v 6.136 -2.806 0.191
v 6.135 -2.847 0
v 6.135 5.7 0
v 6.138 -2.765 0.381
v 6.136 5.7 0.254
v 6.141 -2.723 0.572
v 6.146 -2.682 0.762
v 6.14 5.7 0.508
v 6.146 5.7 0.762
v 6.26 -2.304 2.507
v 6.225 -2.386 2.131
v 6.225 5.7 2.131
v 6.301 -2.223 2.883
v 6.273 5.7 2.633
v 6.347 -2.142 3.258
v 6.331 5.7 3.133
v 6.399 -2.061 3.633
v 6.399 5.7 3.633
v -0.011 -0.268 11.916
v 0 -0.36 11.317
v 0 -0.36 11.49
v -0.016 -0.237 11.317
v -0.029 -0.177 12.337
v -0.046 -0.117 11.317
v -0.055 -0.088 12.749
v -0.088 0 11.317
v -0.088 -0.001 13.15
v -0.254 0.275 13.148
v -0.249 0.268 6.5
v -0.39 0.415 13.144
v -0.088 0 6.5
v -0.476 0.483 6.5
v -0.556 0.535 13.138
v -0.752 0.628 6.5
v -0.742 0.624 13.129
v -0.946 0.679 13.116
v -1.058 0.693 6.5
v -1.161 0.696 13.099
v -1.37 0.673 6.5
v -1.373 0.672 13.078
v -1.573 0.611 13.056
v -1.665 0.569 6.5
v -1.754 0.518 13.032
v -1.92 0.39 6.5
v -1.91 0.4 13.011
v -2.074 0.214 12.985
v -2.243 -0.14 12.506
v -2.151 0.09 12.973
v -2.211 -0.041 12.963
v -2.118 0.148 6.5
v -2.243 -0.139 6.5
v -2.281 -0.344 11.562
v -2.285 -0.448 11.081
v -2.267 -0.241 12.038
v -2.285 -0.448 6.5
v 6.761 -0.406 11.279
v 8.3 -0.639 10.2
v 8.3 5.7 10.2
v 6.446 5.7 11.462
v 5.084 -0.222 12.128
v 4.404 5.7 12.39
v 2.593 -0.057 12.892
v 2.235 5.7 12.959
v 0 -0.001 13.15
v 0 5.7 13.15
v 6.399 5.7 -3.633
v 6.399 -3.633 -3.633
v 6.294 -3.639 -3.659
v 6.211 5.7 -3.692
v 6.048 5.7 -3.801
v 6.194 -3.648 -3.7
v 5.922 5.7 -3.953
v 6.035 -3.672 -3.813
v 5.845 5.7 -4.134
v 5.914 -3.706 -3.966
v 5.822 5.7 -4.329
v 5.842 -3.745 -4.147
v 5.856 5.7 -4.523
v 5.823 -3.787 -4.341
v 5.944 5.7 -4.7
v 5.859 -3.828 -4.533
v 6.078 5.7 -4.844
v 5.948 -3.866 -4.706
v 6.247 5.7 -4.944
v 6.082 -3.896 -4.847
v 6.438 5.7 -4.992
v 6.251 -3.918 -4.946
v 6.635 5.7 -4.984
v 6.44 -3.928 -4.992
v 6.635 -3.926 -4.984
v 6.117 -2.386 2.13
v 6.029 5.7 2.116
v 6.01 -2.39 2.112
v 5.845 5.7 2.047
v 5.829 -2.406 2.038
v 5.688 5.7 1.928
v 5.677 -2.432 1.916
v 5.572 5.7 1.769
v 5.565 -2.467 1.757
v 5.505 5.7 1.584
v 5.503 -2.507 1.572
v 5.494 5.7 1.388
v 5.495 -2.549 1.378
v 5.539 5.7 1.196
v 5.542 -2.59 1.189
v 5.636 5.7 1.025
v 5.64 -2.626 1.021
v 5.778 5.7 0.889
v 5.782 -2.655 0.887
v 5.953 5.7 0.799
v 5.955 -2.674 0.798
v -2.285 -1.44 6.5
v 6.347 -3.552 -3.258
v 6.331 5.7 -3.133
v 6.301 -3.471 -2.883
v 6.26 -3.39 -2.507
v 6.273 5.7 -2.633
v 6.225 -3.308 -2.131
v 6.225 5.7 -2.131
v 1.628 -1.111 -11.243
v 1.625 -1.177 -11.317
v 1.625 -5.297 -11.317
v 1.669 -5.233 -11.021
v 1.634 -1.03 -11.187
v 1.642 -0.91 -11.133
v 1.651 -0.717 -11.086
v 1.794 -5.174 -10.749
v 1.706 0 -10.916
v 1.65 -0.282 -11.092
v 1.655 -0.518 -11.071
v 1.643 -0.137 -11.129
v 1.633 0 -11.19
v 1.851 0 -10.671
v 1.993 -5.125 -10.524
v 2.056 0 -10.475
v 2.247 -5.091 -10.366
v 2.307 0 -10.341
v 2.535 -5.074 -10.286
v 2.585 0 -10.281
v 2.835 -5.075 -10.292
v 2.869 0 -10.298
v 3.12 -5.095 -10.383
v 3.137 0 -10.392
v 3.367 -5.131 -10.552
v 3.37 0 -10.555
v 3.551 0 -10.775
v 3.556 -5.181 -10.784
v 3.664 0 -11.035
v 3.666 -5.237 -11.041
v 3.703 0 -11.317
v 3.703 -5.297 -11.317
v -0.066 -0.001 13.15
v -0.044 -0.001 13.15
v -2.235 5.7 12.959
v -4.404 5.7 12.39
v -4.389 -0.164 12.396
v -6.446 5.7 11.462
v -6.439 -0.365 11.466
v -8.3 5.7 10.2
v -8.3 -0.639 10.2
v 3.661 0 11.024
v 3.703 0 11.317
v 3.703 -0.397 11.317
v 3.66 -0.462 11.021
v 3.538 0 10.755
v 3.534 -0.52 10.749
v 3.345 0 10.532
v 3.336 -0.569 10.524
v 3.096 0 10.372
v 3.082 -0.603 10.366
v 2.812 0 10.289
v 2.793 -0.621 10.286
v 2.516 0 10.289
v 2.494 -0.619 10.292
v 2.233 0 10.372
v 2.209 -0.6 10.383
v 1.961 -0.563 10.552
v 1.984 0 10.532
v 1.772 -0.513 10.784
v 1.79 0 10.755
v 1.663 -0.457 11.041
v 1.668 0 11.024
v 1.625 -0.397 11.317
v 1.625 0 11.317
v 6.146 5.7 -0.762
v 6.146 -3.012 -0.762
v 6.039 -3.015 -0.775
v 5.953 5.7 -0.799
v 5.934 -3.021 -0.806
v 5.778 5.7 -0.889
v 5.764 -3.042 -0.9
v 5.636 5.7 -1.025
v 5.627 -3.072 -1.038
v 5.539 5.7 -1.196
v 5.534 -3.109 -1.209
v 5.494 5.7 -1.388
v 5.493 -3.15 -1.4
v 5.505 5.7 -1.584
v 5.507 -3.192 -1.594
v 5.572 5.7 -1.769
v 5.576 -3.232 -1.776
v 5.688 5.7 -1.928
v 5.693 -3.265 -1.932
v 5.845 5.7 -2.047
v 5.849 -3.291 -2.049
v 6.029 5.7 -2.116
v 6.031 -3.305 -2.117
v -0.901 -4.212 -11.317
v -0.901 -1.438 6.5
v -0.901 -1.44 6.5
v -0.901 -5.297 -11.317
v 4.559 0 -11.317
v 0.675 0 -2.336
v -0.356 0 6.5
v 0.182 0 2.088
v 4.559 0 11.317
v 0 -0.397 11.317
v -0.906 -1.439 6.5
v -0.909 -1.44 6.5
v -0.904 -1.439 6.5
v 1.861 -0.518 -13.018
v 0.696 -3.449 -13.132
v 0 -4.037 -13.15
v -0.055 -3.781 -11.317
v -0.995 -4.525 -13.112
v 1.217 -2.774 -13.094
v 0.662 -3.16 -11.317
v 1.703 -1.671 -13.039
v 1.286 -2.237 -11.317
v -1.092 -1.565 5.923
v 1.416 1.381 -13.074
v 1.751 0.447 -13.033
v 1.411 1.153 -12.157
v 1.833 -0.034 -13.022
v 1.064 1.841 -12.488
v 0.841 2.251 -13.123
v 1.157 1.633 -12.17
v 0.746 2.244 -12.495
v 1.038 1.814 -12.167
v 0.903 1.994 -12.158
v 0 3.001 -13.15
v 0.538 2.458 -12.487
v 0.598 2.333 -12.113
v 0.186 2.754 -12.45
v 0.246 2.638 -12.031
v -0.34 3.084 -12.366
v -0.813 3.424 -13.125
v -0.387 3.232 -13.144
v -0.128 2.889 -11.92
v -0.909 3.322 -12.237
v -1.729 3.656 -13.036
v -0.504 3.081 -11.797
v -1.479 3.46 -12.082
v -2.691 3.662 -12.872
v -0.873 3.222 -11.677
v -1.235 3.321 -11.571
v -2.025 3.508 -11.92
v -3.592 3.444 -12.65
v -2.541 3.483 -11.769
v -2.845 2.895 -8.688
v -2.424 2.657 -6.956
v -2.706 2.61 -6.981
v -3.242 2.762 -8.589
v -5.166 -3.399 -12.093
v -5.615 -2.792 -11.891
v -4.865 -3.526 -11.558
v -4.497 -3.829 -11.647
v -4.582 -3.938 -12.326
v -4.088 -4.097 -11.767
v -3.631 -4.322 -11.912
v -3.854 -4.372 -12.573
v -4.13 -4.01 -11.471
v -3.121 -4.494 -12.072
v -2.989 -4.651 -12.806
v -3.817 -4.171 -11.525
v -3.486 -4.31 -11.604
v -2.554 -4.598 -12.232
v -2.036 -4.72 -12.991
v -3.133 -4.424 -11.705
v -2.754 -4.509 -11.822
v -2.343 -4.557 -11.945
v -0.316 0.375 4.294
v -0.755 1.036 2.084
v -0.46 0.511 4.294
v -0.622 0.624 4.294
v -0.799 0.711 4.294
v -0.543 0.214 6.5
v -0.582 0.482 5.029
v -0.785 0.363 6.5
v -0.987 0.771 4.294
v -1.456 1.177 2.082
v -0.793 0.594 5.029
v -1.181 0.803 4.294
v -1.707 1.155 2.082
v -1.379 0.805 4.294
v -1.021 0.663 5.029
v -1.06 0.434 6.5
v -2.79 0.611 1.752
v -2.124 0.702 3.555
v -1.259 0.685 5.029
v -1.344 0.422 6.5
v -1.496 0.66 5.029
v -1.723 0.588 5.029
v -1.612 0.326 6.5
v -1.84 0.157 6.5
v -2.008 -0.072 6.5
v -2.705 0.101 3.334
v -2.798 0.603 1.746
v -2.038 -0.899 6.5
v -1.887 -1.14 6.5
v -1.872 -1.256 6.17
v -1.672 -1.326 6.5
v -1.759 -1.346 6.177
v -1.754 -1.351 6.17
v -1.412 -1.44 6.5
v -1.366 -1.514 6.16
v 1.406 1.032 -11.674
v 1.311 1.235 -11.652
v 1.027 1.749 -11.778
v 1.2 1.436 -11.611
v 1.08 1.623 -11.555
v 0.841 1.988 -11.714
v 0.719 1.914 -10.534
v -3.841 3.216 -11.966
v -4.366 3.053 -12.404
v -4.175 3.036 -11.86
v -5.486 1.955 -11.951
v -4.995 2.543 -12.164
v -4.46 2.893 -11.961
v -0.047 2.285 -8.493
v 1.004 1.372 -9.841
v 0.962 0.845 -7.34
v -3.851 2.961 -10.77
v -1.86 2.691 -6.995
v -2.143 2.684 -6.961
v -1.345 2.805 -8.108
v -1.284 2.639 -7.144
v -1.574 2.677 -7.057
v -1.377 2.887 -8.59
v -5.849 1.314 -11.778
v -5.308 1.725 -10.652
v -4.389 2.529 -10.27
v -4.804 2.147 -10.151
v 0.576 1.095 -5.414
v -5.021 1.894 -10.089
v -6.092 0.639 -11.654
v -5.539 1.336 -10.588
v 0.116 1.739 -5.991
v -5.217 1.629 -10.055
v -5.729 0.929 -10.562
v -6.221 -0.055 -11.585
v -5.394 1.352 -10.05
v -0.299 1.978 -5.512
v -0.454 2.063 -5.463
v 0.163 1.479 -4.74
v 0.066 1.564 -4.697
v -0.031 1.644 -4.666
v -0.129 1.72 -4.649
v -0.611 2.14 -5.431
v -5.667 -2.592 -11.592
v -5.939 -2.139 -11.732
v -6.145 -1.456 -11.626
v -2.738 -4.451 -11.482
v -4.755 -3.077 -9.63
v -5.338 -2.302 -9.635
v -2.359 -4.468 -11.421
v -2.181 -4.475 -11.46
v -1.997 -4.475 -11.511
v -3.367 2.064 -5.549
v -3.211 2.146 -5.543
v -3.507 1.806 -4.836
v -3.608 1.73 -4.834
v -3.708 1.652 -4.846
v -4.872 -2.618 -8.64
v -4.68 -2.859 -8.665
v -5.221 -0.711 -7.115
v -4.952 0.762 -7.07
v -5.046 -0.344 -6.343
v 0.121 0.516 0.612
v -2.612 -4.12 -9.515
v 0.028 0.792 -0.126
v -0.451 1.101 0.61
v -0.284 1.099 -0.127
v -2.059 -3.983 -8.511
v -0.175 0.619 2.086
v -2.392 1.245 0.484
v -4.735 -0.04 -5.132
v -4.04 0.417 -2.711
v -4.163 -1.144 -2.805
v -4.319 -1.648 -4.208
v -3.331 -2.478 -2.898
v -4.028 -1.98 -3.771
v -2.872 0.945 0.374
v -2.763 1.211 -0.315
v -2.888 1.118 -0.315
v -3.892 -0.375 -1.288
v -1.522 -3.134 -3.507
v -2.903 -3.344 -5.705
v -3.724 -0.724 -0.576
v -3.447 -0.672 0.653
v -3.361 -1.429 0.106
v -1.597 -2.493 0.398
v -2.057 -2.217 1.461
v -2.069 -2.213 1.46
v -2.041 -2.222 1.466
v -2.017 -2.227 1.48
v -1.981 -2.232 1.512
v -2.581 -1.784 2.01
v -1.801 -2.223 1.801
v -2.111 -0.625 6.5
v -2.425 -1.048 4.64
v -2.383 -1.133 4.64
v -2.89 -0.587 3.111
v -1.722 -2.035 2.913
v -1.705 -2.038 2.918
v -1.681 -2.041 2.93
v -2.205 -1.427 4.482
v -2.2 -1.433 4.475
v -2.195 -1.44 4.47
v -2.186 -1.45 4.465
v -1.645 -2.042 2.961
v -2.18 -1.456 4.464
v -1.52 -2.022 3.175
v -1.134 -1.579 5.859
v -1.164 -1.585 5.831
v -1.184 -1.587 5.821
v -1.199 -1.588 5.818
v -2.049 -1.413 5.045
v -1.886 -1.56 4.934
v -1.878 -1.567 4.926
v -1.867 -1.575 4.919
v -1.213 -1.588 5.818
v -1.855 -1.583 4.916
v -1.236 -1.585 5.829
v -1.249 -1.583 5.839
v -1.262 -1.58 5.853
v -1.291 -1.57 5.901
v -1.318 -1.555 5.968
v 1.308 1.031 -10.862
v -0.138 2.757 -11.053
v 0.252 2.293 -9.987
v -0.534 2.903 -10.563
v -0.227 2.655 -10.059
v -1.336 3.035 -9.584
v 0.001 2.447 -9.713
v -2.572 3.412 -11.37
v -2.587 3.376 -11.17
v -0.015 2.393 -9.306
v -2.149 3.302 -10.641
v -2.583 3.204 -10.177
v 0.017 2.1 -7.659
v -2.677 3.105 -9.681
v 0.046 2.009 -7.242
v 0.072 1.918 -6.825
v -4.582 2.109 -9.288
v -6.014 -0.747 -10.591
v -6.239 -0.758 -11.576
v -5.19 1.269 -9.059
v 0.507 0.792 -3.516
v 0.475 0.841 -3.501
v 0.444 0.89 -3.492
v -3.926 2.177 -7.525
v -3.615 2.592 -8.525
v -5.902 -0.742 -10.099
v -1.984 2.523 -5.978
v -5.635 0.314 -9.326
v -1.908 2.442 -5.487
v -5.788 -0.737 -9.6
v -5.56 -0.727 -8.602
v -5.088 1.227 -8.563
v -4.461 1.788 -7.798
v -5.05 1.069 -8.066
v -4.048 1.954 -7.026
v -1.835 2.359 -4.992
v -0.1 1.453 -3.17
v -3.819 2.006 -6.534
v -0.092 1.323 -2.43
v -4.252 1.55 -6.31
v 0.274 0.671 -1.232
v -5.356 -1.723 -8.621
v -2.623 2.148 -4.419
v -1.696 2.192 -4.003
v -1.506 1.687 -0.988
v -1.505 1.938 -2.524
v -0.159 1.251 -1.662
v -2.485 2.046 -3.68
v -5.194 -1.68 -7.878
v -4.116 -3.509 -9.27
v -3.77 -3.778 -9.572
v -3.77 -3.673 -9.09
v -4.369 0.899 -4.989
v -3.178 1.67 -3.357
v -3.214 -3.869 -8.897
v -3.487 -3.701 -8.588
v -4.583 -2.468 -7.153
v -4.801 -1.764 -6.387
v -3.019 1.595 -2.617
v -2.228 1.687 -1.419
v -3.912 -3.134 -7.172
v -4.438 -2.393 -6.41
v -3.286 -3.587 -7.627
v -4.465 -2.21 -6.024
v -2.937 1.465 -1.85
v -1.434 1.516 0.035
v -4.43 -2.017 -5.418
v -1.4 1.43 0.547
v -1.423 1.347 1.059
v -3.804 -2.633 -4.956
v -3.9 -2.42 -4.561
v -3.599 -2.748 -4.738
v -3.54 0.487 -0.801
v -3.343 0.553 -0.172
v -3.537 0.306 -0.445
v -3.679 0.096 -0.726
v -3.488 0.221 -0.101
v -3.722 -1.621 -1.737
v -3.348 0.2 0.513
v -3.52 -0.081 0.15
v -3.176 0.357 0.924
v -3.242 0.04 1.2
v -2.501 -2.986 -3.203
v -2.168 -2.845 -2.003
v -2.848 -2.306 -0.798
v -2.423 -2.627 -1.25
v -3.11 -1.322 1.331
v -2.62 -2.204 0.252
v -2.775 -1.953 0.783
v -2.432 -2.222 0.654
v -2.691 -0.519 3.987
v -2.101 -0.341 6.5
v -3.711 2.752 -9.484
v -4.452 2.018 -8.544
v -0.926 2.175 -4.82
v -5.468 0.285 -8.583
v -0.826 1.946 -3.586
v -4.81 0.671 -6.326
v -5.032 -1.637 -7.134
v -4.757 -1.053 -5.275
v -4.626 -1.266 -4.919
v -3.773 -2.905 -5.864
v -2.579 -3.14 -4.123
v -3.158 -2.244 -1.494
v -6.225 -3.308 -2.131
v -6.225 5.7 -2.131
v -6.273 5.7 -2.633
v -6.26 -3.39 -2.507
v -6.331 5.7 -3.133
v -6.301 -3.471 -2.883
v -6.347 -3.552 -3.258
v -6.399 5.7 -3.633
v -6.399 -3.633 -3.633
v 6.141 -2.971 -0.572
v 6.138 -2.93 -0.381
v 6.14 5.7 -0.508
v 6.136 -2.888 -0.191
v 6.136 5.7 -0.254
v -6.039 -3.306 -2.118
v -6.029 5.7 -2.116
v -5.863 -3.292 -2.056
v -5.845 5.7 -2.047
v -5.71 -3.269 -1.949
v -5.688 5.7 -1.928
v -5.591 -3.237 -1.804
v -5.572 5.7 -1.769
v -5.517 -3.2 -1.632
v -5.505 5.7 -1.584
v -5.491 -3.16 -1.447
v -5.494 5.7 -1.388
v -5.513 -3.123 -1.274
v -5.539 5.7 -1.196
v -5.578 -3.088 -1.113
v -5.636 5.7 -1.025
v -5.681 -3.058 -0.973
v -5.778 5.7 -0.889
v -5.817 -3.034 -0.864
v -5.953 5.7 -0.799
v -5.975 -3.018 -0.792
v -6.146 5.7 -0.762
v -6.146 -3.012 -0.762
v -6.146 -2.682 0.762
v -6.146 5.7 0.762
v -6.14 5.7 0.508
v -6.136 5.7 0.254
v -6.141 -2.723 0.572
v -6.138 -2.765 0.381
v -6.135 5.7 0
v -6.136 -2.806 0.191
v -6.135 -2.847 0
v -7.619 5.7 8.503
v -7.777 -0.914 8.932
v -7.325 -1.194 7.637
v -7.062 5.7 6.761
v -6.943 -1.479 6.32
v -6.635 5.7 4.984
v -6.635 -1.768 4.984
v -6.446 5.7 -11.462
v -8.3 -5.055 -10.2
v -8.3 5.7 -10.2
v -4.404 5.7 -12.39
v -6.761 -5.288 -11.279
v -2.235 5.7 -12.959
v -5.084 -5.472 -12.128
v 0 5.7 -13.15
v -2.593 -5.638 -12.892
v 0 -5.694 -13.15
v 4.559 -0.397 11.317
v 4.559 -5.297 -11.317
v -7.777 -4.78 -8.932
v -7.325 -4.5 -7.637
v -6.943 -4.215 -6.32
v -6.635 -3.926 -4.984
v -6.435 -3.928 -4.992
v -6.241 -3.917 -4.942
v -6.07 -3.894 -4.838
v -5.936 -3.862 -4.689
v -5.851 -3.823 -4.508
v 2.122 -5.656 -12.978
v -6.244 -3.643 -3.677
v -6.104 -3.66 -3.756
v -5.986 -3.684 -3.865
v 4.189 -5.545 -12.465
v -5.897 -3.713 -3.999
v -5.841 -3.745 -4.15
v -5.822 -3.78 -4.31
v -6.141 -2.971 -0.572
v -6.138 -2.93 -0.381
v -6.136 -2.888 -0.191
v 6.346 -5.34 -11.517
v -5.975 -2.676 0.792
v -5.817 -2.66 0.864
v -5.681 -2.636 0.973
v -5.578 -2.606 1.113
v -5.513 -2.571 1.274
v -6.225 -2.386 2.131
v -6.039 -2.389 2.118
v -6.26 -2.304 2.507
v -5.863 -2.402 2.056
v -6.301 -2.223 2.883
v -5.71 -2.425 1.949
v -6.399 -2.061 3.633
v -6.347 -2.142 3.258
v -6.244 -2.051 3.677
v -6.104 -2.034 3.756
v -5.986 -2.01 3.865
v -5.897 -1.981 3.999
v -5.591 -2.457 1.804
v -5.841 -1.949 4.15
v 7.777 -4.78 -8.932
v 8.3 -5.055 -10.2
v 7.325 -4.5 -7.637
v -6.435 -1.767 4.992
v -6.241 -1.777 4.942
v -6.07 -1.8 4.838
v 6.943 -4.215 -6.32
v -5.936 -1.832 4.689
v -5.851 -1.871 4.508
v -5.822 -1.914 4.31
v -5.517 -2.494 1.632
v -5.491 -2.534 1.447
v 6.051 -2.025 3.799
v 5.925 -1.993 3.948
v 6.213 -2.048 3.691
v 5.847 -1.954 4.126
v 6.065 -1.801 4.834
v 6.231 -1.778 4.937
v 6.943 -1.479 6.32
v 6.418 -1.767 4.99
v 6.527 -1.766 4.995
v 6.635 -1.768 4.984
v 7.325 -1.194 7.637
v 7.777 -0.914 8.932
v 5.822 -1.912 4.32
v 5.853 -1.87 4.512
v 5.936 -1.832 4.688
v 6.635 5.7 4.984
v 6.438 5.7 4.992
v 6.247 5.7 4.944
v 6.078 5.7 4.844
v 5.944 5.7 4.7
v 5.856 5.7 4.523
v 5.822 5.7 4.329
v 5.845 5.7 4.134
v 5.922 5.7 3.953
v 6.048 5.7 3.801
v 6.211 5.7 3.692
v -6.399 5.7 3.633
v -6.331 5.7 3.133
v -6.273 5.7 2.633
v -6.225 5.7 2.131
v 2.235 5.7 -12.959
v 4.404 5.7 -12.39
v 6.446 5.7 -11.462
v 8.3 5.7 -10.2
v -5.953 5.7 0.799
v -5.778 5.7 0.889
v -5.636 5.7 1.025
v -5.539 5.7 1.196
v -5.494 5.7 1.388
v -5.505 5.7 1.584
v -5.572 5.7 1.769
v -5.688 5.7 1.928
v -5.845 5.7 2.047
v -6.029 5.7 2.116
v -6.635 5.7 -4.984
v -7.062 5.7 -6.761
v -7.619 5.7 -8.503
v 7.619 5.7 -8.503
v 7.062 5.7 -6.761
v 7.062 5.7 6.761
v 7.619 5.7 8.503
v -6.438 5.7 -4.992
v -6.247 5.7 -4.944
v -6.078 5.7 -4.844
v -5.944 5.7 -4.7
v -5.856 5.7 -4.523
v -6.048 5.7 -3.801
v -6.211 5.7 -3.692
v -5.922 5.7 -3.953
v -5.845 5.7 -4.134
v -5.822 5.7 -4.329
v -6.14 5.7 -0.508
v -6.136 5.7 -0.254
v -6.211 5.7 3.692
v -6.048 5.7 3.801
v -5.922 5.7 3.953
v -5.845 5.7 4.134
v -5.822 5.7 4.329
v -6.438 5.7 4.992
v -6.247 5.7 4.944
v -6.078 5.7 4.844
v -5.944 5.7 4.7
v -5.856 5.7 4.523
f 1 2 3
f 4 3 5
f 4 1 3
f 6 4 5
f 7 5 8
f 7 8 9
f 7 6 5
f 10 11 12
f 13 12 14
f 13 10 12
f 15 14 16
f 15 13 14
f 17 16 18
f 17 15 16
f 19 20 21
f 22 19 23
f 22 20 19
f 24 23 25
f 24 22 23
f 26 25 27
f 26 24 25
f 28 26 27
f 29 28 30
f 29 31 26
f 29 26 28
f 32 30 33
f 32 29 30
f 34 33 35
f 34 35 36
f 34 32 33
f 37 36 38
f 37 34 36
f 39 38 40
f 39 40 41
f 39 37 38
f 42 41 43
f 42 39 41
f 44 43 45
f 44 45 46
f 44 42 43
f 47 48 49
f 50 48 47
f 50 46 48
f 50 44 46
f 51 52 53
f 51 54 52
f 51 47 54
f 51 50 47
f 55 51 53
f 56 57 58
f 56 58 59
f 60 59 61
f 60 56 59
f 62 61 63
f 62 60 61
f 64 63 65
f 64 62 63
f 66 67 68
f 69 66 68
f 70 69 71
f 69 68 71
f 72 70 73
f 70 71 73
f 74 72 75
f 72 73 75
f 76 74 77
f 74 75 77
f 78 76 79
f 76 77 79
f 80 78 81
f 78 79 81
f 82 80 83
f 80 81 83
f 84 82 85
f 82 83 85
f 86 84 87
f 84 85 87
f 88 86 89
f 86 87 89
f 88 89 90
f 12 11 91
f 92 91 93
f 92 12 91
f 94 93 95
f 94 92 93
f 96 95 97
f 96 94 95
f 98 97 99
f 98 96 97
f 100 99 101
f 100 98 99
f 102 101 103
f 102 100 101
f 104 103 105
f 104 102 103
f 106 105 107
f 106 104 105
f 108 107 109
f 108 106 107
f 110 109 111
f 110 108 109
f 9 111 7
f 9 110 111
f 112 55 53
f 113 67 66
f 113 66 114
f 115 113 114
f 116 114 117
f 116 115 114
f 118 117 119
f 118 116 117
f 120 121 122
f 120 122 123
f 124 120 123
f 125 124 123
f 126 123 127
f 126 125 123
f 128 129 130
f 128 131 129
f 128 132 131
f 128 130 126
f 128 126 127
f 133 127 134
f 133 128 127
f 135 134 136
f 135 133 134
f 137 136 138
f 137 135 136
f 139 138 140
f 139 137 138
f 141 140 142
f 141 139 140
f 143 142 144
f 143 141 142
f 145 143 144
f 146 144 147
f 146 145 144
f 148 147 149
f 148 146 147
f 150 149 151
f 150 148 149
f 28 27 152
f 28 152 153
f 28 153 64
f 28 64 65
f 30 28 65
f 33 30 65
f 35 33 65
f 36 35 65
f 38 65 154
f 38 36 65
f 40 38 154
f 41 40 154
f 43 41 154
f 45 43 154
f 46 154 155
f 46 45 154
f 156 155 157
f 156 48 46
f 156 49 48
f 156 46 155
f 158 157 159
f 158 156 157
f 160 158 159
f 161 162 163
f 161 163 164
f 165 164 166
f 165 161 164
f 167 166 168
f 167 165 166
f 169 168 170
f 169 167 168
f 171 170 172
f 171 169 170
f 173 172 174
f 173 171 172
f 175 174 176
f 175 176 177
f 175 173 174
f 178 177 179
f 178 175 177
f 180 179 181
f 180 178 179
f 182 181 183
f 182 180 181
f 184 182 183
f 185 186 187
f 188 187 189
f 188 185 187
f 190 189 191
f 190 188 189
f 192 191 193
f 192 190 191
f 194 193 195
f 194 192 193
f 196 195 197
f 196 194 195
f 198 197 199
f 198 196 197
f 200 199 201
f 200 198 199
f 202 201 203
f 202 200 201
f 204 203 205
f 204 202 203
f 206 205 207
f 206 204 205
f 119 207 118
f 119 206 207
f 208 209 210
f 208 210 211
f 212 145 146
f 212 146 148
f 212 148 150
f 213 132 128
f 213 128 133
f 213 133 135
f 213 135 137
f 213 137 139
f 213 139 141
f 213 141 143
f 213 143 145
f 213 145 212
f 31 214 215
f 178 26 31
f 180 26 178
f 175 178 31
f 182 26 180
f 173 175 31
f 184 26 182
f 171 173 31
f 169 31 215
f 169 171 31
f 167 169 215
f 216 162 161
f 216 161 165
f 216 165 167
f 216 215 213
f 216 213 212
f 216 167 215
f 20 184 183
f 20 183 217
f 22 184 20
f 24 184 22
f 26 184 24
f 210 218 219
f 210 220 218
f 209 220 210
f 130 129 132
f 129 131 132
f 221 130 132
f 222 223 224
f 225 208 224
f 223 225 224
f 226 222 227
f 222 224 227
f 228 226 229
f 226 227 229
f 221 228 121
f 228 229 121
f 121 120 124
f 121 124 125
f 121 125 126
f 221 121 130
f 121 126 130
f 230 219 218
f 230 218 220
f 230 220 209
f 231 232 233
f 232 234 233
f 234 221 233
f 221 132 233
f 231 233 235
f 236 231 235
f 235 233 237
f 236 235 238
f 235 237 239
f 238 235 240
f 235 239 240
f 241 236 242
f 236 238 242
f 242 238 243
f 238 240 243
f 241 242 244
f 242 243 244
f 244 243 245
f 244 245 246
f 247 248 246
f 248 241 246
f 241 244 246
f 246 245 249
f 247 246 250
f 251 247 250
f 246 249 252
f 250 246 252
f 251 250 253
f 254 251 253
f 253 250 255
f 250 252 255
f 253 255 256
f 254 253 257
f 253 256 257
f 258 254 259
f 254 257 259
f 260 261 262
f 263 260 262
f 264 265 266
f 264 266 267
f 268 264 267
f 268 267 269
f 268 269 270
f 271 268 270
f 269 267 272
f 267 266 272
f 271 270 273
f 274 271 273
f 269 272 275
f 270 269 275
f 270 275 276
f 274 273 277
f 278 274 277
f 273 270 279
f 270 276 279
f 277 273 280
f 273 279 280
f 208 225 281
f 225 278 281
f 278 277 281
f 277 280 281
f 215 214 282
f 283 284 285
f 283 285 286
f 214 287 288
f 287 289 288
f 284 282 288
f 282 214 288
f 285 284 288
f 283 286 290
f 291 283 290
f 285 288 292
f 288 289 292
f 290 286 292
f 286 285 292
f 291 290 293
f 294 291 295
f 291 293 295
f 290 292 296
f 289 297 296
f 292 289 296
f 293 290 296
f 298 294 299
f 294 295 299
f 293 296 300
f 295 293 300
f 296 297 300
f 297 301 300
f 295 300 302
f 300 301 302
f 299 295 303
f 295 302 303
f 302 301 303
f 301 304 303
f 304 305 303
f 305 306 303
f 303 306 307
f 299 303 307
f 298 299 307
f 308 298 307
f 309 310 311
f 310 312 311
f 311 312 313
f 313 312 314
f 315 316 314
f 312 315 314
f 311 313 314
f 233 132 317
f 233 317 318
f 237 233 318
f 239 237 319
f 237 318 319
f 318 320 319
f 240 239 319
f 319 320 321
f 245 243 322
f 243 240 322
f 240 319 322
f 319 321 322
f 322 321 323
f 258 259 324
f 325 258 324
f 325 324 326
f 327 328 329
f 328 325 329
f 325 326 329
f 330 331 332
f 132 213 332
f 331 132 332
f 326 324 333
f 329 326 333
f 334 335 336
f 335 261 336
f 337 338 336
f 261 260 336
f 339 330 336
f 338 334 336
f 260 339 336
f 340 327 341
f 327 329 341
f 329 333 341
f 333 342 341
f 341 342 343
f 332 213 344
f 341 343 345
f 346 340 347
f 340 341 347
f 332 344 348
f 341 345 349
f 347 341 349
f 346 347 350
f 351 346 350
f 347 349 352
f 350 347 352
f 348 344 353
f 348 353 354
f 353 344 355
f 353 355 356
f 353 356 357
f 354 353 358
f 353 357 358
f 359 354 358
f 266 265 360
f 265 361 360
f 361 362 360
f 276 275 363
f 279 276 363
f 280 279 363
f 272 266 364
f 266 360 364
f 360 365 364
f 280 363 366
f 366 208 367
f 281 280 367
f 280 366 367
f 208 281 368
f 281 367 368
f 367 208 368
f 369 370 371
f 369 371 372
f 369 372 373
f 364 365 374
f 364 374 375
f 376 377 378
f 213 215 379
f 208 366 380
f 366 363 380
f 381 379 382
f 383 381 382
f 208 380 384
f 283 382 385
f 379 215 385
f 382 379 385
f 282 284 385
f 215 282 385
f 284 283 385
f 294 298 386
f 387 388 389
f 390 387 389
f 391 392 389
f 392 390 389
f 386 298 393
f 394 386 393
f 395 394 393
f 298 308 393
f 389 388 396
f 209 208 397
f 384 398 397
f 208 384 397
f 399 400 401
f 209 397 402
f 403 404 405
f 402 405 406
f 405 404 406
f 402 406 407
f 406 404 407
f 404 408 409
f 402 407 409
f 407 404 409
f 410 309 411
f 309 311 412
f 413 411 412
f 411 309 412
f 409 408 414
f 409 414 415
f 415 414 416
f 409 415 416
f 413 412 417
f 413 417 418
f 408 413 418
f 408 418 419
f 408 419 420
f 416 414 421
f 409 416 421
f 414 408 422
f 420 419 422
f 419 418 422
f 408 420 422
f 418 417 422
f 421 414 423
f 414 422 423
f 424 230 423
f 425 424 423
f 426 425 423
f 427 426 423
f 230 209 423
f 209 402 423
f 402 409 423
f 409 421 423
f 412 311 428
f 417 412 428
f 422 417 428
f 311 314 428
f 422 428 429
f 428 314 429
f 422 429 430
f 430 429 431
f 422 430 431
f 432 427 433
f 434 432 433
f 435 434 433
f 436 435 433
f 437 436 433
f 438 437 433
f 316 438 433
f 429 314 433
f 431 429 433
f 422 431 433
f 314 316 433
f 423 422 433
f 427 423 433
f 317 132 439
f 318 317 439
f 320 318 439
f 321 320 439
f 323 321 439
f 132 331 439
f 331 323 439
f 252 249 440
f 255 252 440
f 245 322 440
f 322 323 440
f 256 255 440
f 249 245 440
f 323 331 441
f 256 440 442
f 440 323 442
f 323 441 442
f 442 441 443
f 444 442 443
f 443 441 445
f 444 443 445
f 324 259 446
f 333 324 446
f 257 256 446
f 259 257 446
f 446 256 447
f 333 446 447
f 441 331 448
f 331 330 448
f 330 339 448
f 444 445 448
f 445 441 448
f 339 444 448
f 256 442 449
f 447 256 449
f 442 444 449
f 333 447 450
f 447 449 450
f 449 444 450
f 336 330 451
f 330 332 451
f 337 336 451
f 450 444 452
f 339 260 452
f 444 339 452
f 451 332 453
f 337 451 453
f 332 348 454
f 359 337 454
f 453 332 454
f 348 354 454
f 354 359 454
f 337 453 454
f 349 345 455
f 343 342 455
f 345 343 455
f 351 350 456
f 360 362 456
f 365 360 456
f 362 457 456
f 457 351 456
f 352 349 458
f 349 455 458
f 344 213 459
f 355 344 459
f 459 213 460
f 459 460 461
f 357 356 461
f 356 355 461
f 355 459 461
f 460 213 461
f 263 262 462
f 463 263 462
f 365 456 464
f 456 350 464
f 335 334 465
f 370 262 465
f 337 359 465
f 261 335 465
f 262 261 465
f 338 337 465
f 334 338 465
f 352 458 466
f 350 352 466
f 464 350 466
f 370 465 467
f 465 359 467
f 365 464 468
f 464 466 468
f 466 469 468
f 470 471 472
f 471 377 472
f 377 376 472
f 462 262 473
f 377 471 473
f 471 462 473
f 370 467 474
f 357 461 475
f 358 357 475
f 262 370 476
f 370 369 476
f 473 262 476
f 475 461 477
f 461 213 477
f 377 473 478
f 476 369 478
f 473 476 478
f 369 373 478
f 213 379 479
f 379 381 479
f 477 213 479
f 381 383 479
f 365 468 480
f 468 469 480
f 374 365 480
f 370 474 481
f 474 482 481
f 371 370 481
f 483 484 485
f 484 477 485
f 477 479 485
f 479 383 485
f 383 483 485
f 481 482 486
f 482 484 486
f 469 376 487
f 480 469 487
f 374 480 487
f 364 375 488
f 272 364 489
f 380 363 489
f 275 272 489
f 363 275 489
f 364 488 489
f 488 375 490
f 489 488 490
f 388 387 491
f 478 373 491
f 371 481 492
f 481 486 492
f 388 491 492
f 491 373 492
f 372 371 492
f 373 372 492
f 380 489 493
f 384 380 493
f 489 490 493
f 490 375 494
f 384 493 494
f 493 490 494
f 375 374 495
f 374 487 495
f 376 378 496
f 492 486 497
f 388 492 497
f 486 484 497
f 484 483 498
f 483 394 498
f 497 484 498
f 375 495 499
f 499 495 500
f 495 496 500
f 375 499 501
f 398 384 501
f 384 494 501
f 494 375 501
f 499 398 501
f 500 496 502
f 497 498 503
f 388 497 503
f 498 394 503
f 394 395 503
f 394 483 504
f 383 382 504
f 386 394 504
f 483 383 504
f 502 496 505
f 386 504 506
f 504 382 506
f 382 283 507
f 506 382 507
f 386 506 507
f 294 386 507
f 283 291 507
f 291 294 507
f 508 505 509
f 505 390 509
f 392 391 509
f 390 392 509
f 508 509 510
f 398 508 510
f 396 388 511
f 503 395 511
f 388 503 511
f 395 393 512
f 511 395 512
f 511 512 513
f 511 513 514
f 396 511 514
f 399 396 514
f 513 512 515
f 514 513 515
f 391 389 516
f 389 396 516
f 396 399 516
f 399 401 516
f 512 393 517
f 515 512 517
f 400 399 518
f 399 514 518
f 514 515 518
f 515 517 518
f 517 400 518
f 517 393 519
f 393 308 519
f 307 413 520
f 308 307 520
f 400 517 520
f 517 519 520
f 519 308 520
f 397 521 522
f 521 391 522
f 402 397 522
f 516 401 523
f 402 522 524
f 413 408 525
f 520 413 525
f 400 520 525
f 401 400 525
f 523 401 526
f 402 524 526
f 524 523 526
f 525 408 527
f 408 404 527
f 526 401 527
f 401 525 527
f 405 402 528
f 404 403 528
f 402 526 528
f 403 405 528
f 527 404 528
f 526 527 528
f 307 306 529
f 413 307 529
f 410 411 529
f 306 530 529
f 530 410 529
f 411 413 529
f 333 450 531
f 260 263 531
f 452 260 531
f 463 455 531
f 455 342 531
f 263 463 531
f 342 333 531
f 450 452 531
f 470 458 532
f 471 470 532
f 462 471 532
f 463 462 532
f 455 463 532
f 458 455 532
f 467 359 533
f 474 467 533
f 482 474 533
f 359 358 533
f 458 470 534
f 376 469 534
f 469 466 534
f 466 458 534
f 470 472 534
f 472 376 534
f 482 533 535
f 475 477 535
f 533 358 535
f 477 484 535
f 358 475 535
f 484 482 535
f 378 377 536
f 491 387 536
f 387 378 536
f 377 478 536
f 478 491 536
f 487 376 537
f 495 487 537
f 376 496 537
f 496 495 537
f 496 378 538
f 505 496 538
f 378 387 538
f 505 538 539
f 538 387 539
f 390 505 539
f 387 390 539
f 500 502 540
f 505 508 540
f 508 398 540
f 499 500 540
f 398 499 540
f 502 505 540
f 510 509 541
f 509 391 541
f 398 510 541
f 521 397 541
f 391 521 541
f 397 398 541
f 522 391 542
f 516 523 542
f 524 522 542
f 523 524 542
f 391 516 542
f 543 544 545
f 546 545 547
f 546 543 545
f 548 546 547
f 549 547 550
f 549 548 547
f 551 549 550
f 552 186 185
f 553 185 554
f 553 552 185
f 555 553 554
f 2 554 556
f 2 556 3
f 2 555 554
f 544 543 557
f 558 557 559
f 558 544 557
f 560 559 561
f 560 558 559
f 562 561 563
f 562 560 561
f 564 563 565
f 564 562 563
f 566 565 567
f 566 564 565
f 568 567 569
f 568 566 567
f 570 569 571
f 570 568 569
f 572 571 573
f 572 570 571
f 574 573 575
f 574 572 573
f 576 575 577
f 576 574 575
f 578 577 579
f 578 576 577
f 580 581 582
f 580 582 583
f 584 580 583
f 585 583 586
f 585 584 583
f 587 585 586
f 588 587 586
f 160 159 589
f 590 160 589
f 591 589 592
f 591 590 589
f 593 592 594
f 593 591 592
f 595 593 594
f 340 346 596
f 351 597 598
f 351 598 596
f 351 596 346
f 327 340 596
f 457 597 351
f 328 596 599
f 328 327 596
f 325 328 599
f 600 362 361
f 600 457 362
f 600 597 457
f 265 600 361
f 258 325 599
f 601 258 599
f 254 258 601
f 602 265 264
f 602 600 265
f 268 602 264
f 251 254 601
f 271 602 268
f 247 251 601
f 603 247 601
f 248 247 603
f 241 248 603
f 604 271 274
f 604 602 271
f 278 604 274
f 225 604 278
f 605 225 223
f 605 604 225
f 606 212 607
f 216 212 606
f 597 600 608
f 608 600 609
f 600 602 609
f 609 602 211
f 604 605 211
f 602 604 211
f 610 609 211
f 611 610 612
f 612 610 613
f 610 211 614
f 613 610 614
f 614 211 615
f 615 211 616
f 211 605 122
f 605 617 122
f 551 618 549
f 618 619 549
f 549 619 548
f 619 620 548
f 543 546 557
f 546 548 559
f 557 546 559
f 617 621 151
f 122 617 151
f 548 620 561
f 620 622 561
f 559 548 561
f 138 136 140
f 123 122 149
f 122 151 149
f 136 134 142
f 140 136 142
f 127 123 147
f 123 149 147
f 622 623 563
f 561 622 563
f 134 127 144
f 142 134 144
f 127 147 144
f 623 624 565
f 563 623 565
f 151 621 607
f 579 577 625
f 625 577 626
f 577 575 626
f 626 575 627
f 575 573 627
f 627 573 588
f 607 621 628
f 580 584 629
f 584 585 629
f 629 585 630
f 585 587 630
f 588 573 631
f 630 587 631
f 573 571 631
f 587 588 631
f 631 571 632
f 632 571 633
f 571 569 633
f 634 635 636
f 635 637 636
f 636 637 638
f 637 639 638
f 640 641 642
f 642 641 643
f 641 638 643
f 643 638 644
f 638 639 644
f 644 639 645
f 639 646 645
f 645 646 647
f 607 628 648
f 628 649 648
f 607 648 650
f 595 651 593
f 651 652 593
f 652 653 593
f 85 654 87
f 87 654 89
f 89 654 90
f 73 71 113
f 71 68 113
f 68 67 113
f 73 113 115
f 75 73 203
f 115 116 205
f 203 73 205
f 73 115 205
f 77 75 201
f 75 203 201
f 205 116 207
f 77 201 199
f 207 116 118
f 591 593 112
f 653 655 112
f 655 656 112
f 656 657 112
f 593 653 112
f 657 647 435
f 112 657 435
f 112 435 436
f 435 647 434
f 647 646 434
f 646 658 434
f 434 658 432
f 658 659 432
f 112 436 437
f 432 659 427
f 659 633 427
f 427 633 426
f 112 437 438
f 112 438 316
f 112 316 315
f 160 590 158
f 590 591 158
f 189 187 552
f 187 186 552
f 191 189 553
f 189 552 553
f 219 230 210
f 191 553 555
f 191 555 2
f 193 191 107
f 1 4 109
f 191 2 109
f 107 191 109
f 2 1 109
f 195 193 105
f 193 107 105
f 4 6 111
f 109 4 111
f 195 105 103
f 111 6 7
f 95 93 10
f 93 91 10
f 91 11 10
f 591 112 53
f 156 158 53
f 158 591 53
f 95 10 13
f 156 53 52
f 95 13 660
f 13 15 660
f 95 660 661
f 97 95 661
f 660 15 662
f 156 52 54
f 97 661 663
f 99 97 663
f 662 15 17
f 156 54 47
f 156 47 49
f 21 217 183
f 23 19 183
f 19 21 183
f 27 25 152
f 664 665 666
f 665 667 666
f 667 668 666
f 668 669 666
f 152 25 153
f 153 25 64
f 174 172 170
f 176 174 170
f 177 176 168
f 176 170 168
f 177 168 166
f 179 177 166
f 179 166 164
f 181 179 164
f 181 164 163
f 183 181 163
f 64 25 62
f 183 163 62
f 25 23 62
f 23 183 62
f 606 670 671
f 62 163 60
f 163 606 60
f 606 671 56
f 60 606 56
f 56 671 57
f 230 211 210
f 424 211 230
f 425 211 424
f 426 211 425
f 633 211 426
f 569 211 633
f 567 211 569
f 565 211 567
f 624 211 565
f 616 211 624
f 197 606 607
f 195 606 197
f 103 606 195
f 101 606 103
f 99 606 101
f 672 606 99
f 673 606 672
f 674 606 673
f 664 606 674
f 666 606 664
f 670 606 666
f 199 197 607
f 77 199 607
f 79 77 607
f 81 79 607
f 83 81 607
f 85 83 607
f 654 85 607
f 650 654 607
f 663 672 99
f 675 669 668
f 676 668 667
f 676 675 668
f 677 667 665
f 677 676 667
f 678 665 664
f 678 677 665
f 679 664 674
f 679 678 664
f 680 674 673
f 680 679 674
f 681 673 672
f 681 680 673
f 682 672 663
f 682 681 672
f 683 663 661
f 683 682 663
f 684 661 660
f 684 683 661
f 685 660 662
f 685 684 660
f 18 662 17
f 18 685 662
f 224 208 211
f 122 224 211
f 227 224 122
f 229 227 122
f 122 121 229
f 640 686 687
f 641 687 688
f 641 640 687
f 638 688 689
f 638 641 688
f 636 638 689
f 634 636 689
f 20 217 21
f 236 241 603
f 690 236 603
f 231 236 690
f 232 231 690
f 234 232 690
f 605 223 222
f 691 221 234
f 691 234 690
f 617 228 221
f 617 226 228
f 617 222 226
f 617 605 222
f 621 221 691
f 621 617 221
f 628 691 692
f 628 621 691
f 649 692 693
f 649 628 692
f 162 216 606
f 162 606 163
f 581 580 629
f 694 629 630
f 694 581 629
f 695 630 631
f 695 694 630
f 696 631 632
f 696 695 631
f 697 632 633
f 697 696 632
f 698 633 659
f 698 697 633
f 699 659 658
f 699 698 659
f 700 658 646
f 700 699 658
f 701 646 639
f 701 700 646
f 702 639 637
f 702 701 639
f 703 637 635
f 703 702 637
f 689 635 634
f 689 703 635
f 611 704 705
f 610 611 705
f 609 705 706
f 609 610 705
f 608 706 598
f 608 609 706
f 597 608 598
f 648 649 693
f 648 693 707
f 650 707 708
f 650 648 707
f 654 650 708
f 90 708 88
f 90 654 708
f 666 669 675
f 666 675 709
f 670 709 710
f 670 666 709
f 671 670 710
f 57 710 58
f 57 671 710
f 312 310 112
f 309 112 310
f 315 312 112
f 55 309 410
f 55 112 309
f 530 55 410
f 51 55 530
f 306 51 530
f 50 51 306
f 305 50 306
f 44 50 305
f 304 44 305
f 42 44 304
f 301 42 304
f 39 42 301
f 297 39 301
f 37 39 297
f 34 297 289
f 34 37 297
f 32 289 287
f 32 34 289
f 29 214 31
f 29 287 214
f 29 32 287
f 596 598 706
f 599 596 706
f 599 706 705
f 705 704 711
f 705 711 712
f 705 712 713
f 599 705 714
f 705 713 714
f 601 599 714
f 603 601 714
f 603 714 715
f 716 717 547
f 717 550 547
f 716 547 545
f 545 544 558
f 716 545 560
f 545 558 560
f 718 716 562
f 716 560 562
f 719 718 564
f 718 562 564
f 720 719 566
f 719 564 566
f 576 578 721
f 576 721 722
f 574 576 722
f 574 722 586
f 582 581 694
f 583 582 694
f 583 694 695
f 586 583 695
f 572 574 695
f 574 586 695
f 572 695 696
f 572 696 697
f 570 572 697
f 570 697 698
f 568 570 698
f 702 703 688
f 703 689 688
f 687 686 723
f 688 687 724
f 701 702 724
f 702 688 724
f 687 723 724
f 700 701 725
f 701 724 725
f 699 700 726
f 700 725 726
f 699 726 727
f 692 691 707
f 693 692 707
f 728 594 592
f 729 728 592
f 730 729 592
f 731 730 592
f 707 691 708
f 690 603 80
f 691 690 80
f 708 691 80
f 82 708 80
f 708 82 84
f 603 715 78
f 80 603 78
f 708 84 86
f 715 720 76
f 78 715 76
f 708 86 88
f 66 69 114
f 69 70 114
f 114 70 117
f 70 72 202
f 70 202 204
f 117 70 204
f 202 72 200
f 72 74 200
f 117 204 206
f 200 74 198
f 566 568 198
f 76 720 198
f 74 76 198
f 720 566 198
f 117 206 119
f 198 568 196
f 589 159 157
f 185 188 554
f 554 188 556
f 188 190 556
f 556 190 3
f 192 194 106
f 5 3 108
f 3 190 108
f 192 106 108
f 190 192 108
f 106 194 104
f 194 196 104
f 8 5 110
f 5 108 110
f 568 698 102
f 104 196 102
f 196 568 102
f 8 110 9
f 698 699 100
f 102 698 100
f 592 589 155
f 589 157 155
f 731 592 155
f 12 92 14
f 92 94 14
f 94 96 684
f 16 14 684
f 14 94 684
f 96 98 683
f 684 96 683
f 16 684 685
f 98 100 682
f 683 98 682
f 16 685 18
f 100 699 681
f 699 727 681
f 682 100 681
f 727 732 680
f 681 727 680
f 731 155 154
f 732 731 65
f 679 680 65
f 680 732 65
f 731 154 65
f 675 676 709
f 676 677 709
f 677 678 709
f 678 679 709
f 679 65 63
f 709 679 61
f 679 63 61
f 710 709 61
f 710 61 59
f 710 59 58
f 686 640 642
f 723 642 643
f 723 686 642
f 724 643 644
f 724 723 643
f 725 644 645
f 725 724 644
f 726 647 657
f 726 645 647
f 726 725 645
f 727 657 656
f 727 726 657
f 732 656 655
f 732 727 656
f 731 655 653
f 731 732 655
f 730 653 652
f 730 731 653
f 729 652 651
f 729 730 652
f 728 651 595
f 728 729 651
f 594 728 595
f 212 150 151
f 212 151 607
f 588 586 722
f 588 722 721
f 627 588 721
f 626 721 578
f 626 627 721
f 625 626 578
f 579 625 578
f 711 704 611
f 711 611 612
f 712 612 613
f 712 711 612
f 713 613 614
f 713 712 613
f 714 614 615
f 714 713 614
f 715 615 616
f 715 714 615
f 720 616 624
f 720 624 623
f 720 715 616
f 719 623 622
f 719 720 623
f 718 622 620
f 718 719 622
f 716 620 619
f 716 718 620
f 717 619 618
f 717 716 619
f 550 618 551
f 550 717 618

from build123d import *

# Parameters (mm, degrees)
F1_DEPTH  = 5.7
F3_DEPTH  = 18.44198
F4_R      = 0.685572
F4_R_2    = 0.6855
F5_DEPTH  = 15.48248
F7_DEPTH  = 25
F10_R     = 4.298757
F11_R     = 0.956545
F14_DEPTH = 25


with BuildPart() as f1:
    # F0 (on Front) → F1 (new body, symmetric)
    with BuildSketch(Plane.XZ):
        with BuildLine():
            ThreePointArc((-8.3, 10.199632), (-6.682161, 5.213445), (-6.13493, 0))
            ThreePointArc((-6.13493, 0), (-6.682161, -5.213445), (-8.3, -10.199632))
            ThreePointArc((-8.3, -10.199632), (-4.404392, -12.390473), (0, -13.15))
            ThreePointArc((0, -13.15), (4.404392, -12.390473), (8.3, -10.199632))
            ThreePointArc((8.3, -10.199632), (6.682161, -5.213445), (6.13493, 0))
            ThreePointArc((6.13493, 0), (6.682161, 5.213445), (8.3, 10.199632))
            ThreePointArc((8.3, 10.199632), (4.404392, 12.390473), (0, 13.15))
            ThreePointArc((0, 13.15), (-4.404392, 12.390473), (-8.3, 10.199632))
        make_face()
    extrude(amount=F1_DEPTH, both=True)

    # F2 (on Right) → F3 (cut, symmetric)
    with BuildSketch(Plane.YZ):
        Polygon((-5.998229, -14.557695), (0, 13.152902), (-5.998229, 13.152902), align=None)
    extrude(amount=F3_DEPTH, both=True, mode=Mode.SUBTRACT)

    # F4 (on Front) → F5 (cut, symmetric)
    with BuildSketch(Plane.XZ):
        with Locations((-6.507615, 4.309945)):
            Circle(F4_R)
        with Locations((-6.507615, -4.309945)):
            Circle(F4_R)
        with Locations((-6.176657, 1.446914)):
            Circle(F4_R_2)
        with Locations((-6.176657, -1.446914)):
            Circle(F4_R_2)
        with Locations((6.507615, 4.309945)):
            Circle(F4_R)
        with Locations((6.176657, 1.446914)):
            Circle(F4_R_2)
        with Locations((6.176657, -1.446914)):
            Circle(F4_R_2)
        with Locations((6.507615, -4.309945)):
            Circle(F4_R)
    extrude(amount=F5_DEPTH, both=True, mode=Mode.SUBTRACT)

    # F6 (on Front) → F7 (cut)
    with BuildSketch(Plane.XZ):
        with BuildLine():
            Line((4.558944, 0), (4.558944, 11.317))
            Line((4.558944, 11.317), (3.703271, 11.317))
            ThreePointArc((3.703271, 11.317), (2.664347, 10.278075), (1.625422, 11.317))
            Line((1.625422, 11.317), (-0.900685, 11.317))
            Line((-0.900685, 11.317), (-0.900685, 0))
            Line((-0.900685, 0), (-0.900685, -11.317))
            Line((-0.900685, -11.317), (1.625422, -11.317))
            ThreePointArc((1.625422, -11.317), (2.664347, -10.278075), (3.703271, -11.317))
            Line((3.703271, -11.317), (4.558944, -11.317))
            Line((4.558944, -11.317), (4.558944, 0))
        make_face()
    extrude(amount=F7_DEPTH, mode=Mode.SUBTRACT)

    # F10 (on offset) → F12 section 0
    with BuildSketch(Plane.XY.offset(-13.5)):
        with Locations((-2.386769, -0.51822)):
            Circle(F10_R)
    # F11 (on offset) → F12 section 1
    with BuildSketch(Plane.XY.offset(6.5)):
        with Locations((-1.16075, -0.51719)):
            Circle(F11_R)
    loft(mode=Mode.SUBTRACT)

    # F13 (on offset) → F14 (cut)
    with BuildSketch(Plane.XY.offset(6.5)):
        with BuildLine():
            Line((0, -5.757191), (0, -0.359881))
            ThreePointArc((0, -0.359881), (-1.185312, 0.695174), (-2.285457, -0.448411))
            Line((-2.285457, -0.448411), (-2.285457, -5.757191))
            Line((-2.285457, -5.757191), (0, -5.757191))
        make_face()
    extrude(amount=F14_DEPTH, mode=Mode.SUBTRACT)


solid = f1.part
